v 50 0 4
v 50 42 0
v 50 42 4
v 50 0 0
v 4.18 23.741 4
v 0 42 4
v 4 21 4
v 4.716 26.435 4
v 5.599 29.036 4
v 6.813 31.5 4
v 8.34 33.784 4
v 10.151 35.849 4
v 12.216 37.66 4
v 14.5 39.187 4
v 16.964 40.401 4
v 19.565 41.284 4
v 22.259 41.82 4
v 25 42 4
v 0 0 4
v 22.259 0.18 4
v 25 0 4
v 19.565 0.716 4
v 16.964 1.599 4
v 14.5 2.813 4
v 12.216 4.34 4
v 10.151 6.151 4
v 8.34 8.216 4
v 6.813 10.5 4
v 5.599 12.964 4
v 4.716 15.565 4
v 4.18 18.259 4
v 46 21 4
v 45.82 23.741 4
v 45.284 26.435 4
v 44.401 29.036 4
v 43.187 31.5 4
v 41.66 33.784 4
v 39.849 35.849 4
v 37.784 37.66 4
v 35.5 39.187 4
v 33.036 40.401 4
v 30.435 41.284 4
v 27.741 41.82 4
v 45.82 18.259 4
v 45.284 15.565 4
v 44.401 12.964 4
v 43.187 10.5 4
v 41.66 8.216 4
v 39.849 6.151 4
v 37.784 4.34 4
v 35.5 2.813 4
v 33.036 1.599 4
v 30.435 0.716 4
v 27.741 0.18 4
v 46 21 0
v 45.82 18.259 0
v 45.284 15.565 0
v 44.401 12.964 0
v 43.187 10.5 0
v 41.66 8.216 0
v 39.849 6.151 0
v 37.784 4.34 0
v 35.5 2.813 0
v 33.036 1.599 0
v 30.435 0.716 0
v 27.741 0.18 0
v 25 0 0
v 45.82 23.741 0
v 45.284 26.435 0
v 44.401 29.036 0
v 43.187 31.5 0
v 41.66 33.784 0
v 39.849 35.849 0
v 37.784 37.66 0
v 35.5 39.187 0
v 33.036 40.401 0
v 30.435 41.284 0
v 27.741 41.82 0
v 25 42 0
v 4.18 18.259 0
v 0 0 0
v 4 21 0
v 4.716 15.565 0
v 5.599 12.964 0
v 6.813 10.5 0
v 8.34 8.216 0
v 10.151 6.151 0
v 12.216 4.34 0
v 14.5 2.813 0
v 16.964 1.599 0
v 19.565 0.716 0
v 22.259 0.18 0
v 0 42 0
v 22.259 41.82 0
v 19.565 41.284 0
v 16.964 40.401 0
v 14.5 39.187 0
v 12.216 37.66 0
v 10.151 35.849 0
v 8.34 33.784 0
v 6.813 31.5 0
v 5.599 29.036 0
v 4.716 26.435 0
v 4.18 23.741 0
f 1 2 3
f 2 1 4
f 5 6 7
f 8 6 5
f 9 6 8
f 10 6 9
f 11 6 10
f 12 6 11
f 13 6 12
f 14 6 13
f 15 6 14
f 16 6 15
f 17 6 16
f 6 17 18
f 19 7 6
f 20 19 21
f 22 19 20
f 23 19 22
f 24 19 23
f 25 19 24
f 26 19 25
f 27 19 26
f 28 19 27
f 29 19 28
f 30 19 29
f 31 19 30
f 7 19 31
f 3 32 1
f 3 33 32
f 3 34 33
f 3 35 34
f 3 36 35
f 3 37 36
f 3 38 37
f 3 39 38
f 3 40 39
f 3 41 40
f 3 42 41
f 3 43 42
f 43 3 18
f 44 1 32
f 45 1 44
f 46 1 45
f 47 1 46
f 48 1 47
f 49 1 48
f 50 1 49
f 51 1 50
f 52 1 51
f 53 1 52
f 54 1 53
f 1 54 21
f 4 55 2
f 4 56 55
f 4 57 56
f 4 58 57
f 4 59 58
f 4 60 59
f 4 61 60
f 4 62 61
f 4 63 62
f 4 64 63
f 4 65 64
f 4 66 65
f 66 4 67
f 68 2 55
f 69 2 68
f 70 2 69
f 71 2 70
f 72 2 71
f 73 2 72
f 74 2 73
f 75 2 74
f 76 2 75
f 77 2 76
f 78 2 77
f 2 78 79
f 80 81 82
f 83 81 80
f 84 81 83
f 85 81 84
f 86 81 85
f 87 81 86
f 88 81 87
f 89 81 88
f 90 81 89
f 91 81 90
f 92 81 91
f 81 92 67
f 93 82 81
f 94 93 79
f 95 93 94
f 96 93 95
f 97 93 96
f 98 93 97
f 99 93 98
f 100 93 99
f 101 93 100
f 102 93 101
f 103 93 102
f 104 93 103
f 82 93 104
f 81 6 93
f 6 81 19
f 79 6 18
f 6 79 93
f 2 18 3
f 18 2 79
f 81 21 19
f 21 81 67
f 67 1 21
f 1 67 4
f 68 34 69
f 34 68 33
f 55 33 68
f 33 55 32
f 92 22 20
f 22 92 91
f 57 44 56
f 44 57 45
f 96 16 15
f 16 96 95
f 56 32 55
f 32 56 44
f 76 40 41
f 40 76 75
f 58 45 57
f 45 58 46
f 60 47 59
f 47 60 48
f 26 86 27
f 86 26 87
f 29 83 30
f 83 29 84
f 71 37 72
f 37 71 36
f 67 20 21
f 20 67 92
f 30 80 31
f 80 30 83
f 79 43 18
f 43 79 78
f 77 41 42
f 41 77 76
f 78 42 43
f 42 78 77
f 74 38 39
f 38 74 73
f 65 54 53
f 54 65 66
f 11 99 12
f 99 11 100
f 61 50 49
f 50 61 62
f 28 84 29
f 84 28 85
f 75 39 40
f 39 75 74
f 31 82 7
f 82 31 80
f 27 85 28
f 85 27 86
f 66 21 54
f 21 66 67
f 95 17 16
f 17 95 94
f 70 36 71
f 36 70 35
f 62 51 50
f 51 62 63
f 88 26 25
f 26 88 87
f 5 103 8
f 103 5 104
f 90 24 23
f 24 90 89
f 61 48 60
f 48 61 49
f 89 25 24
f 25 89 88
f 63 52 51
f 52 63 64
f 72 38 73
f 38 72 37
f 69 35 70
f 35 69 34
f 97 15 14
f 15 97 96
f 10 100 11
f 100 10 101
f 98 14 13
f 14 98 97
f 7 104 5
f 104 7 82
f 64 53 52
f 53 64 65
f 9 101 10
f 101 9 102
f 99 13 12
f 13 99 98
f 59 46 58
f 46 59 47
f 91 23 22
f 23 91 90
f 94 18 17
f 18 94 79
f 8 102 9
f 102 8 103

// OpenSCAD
module spur_775_mount(){
  difference(){
    cube([50,42,4]);
    translate([25,21,-0.1]) cylinder(h=4.2,r=21,$fn=48);
  }
}
spur_775_mount();
